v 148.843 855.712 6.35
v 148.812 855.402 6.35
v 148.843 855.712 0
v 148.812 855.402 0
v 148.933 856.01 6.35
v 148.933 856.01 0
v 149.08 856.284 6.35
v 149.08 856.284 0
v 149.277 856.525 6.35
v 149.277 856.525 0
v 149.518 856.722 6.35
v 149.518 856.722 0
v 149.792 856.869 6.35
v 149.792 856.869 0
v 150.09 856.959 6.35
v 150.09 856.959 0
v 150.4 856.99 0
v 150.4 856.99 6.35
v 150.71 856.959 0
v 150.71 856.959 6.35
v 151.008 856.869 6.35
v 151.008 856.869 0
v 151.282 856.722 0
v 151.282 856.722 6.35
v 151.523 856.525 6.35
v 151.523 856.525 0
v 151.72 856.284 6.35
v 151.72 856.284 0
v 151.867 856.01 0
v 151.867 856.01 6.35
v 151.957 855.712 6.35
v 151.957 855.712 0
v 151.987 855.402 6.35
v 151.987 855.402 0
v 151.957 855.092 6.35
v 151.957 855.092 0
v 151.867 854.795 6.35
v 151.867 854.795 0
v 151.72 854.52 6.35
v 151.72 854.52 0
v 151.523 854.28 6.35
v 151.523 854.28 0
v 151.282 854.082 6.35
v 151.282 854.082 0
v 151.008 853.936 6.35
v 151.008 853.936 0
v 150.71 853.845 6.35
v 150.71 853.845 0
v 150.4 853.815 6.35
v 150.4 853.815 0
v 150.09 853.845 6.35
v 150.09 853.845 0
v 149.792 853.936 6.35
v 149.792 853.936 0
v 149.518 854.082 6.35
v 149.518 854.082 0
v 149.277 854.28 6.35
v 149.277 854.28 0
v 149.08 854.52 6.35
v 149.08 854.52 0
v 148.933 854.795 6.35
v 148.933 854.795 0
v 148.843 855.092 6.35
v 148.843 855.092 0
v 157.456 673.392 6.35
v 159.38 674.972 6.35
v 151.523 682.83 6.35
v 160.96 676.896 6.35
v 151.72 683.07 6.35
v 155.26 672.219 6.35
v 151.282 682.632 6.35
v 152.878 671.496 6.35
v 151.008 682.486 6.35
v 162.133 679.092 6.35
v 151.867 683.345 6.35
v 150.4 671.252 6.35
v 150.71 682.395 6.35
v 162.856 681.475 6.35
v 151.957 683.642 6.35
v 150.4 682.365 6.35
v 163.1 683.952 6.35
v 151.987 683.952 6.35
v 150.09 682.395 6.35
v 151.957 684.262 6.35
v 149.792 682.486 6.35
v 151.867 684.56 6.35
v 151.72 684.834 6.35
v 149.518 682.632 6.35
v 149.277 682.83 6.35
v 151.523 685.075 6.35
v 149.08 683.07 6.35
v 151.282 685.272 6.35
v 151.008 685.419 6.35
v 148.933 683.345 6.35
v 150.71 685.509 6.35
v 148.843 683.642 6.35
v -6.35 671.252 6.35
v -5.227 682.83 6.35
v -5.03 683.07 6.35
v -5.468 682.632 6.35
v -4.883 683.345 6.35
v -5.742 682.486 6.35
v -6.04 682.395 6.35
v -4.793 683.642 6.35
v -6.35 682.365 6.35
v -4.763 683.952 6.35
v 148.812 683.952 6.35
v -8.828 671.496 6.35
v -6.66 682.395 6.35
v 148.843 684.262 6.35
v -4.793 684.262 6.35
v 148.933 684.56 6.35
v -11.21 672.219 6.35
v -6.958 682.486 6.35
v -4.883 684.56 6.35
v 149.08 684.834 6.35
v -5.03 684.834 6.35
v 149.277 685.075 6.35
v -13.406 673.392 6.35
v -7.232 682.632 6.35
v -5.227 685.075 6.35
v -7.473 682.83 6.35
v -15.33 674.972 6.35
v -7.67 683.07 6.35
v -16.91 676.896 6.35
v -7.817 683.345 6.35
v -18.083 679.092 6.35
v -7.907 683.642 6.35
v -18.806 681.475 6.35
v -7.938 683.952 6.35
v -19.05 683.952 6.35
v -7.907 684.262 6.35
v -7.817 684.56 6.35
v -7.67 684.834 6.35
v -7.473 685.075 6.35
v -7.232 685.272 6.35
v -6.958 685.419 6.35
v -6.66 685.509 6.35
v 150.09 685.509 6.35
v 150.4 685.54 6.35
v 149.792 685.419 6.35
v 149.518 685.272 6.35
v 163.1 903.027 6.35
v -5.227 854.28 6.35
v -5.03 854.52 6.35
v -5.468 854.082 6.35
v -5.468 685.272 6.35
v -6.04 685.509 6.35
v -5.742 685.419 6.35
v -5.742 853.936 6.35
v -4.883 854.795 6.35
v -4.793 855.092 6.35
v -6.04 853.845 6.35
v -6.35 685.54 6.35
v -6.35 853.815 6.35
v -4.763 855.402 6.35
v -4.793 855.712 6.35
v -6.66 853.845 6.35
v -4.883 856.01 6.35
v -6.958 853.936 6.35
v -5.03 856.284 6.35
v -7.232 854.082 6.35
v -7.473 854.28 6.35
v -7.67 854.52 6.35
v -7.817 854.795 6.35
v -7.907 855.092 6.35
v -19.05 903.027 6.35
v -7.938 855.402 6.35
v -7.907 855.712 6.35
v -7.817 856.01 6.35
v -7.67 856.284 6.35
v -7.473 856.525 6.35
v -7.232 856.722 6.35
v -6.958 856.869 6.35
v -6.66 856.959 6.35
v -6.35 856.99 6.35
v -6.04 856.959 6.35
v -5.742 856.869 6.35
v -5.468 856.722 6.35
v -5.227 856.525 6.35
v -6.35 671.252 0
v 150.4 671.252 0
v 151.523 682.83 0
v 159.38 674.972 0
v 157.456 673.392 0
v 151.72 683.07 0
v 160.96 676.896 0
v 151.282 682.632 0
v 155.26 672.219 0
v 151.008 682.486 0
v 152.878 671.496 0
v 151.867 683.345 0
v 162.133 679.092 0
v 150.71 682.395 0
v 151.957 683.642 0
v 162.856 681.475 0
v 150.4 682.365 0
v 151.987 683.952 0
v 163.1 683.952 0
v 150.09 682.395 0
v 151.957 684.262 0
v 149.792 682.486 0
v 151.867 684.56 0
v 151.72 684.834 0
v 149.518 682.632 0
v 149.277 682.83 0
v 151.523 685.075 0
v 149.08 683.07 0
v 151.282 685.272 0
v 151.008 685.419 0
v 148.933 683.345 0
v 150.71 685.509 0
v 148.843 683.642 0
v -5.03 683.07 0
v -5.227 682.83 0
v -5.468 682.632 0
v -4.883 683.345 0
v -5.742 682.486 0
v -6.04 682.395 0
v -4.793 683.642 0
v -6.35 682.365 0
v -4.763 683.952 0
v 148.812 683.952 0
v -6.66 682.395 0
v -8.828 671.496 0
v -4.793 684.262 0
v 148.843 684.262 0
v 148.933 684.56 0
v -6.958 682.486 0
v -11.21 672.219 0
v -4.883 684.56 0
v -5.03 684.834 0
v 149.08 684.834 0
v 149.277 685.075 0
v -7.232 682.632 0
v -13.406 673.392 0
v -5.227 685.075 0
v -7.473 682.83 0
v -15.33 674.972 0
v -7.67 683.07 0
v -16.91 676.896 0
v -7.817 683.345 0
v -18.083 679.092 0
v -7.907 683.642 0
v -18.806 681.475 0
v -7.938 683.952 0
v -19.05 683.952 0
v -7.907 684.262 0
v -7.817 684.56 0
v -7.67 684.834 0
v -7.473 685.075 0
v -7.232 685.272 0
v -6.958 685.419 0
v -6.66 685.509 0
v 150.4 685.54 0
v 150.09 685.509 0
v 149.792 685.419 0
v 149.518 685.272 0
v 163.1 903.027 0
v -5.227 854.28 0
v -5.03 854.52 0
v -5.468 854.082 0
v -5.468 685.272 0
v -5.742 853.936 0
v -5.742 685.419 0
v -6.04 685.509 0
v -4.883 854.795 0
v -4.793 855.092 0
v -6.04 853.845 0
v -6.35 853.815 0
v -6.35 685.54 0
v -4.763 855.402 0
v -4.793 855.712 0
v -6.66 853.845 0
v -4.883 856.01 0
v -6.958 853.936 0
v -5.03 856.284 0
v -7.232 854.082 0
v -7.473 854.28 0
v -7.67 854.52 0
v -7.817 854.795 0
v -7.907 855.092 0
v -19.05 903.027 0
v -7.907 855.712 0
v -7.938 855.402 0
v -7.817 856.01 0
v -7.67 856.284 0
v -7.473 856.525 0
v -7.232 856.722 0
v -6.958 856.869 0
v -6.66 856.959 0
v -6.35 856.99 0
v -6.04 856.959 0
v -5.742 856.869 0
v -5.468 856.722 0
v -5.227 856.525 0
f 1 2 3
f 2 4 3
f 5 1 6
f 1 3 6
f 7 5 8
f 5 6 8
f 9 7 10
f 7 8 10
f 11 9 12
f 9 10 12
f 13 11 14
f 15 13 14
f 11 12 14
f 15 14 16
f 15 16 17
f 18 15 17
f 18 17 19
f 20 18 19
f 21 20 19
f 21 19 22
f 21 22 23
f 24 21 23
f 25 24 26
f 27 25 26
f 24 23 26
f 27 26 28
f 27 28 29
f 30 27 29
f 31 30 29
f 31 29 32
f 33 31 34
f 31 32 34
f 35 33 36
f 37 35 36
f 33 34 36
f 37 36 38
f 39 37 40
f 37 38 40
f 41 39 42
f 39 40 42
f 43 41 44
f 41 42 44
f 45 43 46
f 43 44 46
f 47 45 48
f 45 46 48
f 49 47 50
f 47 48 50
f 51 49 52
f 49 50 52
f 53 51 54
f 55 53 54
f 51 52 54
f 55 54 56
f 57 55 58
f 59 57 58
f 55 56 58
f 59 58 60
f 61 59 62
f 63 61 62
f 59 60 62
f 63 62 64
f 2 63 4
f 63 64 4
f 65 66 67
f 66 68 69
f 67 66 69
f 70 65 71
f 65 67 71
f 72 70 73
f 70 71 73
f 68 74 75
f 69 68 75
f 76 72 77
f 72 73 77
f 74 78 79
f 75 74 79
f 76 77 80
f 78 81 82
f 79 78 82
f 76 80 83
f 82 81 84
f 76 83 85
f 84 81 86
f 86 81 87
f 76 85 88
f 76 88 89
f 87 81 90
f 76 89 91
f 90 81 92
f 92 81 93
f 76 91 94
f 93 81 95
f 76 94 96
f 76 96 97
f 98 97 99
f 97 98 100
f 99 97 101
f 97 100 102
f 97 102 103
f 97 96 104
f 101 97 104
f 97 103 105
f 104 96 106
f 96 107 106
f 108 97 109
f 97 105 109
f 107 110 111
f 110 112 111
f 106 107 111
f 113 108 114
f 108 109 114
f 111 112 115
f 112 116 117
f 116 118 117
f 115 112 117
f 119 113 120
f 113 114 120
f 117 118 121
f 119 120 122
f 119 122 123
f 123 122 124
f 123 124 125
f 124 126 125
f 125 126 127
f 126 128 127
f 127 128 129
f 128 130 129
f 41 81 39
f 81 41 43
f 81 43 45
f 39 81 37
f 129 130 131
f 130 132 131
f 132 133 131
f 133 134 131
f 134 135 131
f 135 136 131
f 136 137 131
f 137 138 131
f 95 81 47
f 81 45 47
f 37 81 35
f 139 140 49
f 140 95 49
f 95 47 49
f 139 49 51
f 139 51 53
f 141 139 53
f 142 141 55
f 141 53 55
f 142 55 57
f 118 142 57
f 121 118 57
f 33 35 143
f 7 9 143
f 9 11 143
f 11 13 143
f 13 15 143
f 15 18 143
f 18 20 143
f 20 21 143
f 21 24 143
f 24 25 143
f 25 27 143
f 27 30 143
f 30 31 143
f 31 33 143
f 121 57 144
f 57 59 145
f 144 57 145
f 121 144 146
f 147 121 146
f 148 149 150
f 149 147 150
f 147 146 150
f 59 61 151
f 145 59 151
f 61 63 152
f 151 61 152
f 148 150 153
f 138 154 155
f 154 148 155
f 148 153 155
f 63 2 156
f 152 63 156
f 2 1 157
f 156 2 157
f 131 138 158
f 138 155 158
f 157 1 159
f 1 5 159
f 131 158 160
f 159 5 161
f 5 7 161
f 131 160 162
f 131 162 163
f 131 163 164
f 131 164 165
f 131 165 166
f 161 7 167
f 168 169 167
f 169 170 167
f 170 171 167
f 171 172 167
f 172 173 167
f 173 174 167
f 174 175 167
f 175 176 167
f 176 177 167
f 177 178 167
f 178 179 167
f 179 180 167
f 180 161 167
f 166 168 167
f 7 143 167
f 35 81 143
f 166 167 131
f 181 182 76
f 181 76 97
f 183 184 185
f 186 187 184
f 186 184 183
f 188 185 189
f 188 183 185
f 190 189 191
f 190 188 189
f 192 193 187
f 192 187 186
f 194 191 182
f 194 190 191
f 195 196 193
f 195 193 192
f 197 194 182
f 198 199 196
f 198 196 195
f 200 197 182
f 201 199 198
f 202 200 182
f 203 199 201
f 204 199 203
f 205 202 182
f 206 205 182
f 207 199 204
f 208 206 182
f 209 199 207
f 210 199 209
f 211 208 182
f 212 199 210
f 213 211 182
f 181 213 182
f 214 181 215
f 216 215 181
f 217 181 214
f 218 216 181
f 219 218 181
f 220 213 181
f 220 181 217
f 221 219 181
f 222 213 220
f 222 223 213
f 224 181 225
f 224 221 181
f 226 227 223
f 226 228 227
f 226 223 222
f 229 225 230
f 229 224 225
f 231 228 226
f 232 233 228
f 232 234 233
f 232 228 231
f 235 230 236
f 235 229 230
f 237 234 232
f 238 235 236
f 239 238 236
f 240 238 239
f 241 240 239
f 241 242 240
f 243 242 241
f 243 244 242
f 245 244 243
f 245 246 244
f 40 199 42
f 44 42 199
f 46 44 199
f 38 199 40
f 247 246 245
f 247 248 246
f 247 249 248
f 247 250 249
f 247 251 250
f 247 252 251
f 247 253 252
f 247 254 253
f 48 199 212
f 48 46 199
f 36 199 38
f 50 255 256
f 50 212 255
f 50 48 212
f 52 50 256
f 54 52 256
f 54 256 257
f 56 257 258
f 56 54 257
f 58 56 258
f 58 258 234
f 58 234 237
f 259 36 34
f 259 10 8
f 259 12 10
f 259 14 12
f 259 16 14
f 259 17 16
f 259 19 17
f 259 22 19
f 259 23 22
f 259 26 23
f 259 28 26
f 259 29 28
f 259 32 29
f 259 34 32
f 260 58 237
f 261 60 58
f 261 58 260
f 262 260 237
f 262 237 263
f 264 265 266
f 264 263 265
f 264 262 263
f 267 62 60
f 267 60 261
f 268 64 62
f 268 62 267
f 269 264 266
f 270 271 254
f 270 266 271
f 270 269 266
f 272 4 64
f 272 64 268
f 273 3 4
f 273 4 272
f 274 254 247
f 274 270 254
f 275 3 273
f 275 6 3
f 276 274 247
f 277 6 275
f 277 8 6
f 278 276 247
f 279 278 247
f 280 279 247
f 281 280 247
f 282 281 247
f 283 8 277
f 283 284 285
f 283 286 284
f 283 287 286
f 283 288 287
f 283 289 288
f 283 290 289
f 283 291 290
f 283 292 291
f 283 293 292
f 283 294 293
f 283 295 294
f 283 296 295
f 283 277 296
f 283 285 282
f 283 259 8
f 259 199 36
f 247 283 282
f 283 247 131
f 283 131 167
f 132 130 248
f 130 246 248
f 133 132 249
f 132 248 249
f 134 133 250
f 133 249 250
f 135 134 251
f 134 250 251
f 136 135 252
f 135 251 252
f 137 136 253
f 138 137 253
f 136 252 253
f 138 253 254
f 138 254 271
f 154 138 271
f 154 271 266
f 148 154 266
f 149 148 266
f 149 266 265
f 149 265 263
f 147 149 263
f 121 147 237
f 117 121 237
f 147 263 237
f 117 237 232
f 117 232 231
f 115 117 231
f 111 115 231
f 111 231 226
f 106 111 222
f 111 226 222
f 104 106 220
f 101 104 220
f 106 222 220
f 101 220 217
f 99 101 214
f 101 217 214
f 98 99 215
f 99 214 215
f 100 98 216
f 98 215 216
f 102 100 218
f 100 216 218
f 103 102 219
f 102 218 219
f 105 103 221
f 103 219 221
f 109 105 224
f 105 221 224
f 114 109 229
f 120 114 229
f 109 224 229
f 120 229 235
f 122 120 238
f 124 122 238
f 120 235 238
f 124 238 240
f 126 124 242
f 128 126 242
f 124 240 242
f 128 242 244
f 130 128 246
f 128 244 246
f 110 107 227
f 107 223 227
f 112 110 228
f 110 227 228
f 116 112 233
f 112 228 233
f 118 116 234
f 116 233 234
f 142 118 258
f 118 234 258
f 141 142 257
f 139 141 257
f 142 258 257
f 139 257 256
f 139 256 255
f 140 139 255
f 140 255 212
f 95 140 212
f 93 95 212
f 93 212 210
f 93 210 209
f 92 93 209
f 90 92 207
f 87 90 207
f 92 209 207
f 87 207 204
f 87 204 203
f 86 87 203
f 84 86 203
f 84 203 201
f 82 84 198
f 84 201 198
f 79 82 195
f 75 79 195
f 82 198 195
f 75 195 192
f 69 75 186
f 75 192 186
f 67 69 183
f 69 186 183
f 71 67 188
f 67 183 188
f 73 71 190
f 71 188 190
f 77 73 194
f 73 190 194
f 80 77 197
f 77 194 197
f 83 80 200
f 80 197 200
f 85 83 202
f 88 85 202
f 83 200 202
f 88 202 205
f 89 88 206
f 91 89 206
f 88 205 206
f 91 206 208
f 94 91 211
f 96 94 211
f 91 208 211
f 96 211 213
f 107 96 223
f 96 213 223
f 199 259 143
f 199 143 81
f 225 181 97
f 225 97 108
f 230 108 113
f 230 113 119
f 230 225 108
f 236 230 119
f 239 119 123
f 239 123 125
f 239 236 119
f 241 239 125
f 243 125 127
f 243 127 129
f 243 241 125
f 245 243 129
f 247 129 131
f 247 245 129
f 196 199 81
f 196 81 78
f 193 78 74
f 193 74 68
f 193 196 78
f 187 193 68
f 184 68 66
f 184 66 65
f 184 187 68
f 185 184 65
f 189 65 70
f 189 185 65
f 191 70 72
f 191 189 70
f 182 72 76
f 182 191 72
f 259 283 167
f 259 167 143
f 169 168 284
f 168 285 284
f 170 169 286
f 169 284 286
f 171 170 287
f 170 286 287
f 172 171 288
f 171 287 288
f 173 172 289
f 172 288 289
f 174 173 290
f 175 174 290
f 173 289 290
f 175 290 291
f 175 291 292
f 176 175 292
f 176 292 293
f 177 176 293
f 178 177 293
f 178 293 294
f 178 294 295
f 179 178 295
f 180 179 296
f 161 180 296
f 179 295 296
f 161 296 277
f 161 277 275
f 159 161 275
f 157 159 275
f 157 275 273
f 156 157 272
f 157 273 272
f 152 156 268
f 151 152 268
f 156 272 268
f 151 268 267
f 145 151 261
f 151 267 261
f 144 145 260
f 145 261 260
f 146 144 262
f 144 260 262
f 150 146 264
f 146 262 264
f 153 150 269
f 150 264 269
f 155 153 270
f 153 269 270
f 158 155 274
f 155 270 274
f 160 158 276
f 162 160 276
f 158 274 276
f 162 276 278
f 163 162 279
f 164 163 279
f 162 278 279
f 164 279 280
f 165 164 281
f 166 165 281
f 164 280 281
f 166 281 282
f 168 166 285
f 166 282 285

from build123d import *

# Parameters (mm, degrees)
BOSS_EXTRUDE1_DEPTH = 6.35
HOLE1_D             = 3.175
HOLE1_DEPTH         = 31.75
HOLE1_CSINK_D       = 10.16
HOLE1_CSINK_ANGLE   = 82
HOLE1_TIP           = 0.953866233


with BuildPart() as part:
    # Sketch1 → Boss-Extrude1 (new body)
    with BuildSketch(Plane.XY):
        with BuildLine():
            Line((-19.05, 903.02716301), (163.099999994, 903.02716301))
            Line((163.099999994, 903.02716301), (163.099999994, 683.95216301))
            ThreePointArc((163.099999994, 683.95216301), (159.380256115, 674.971906889), (150.399999994, 671.25216301))
            Line((150.399999994, 671.25216301), (-6.35, 671.25216301))
            ThreePointArc((-6.35, 671.25216301), (-15.330256121, 674.971906889), (-19.05, 683.95216301))
            Line((-19.05, 683.95216301), (-19.05, 903.02716301))
        make_face()
    extrude(amount=BOSS_EXTRUDE1_DEPTH)

    # Hole1
    with Locations(Plane(origin=(72.024999997, -454.785607328, 19.05), x_dir=(1, 0, 0), z_dir=(0, 0, 1))):
        with Locations((-78.374999997, 1310.187770337), (-78.374999997, 1138.737770337), (78.374999997, 1138.737770337), (78.374999997, 1310.187770337)):
            CounterSinkHole(HOLE1_D / 2, HOLE1_CSINK_D / 2, depth=HOLE1_DEPTH, counter_sink_angle=HOLE1_CSINK_ANGLE)
            with Locations((0, 0, -(HOLE1_DEPTH + HOLE1_TIP / 2))):  # 118° drill point
                Cone(0, HOLE1_D / 2, HOLE1_TIP, mode=Mode.SUBTRACT)


solid = part.part
